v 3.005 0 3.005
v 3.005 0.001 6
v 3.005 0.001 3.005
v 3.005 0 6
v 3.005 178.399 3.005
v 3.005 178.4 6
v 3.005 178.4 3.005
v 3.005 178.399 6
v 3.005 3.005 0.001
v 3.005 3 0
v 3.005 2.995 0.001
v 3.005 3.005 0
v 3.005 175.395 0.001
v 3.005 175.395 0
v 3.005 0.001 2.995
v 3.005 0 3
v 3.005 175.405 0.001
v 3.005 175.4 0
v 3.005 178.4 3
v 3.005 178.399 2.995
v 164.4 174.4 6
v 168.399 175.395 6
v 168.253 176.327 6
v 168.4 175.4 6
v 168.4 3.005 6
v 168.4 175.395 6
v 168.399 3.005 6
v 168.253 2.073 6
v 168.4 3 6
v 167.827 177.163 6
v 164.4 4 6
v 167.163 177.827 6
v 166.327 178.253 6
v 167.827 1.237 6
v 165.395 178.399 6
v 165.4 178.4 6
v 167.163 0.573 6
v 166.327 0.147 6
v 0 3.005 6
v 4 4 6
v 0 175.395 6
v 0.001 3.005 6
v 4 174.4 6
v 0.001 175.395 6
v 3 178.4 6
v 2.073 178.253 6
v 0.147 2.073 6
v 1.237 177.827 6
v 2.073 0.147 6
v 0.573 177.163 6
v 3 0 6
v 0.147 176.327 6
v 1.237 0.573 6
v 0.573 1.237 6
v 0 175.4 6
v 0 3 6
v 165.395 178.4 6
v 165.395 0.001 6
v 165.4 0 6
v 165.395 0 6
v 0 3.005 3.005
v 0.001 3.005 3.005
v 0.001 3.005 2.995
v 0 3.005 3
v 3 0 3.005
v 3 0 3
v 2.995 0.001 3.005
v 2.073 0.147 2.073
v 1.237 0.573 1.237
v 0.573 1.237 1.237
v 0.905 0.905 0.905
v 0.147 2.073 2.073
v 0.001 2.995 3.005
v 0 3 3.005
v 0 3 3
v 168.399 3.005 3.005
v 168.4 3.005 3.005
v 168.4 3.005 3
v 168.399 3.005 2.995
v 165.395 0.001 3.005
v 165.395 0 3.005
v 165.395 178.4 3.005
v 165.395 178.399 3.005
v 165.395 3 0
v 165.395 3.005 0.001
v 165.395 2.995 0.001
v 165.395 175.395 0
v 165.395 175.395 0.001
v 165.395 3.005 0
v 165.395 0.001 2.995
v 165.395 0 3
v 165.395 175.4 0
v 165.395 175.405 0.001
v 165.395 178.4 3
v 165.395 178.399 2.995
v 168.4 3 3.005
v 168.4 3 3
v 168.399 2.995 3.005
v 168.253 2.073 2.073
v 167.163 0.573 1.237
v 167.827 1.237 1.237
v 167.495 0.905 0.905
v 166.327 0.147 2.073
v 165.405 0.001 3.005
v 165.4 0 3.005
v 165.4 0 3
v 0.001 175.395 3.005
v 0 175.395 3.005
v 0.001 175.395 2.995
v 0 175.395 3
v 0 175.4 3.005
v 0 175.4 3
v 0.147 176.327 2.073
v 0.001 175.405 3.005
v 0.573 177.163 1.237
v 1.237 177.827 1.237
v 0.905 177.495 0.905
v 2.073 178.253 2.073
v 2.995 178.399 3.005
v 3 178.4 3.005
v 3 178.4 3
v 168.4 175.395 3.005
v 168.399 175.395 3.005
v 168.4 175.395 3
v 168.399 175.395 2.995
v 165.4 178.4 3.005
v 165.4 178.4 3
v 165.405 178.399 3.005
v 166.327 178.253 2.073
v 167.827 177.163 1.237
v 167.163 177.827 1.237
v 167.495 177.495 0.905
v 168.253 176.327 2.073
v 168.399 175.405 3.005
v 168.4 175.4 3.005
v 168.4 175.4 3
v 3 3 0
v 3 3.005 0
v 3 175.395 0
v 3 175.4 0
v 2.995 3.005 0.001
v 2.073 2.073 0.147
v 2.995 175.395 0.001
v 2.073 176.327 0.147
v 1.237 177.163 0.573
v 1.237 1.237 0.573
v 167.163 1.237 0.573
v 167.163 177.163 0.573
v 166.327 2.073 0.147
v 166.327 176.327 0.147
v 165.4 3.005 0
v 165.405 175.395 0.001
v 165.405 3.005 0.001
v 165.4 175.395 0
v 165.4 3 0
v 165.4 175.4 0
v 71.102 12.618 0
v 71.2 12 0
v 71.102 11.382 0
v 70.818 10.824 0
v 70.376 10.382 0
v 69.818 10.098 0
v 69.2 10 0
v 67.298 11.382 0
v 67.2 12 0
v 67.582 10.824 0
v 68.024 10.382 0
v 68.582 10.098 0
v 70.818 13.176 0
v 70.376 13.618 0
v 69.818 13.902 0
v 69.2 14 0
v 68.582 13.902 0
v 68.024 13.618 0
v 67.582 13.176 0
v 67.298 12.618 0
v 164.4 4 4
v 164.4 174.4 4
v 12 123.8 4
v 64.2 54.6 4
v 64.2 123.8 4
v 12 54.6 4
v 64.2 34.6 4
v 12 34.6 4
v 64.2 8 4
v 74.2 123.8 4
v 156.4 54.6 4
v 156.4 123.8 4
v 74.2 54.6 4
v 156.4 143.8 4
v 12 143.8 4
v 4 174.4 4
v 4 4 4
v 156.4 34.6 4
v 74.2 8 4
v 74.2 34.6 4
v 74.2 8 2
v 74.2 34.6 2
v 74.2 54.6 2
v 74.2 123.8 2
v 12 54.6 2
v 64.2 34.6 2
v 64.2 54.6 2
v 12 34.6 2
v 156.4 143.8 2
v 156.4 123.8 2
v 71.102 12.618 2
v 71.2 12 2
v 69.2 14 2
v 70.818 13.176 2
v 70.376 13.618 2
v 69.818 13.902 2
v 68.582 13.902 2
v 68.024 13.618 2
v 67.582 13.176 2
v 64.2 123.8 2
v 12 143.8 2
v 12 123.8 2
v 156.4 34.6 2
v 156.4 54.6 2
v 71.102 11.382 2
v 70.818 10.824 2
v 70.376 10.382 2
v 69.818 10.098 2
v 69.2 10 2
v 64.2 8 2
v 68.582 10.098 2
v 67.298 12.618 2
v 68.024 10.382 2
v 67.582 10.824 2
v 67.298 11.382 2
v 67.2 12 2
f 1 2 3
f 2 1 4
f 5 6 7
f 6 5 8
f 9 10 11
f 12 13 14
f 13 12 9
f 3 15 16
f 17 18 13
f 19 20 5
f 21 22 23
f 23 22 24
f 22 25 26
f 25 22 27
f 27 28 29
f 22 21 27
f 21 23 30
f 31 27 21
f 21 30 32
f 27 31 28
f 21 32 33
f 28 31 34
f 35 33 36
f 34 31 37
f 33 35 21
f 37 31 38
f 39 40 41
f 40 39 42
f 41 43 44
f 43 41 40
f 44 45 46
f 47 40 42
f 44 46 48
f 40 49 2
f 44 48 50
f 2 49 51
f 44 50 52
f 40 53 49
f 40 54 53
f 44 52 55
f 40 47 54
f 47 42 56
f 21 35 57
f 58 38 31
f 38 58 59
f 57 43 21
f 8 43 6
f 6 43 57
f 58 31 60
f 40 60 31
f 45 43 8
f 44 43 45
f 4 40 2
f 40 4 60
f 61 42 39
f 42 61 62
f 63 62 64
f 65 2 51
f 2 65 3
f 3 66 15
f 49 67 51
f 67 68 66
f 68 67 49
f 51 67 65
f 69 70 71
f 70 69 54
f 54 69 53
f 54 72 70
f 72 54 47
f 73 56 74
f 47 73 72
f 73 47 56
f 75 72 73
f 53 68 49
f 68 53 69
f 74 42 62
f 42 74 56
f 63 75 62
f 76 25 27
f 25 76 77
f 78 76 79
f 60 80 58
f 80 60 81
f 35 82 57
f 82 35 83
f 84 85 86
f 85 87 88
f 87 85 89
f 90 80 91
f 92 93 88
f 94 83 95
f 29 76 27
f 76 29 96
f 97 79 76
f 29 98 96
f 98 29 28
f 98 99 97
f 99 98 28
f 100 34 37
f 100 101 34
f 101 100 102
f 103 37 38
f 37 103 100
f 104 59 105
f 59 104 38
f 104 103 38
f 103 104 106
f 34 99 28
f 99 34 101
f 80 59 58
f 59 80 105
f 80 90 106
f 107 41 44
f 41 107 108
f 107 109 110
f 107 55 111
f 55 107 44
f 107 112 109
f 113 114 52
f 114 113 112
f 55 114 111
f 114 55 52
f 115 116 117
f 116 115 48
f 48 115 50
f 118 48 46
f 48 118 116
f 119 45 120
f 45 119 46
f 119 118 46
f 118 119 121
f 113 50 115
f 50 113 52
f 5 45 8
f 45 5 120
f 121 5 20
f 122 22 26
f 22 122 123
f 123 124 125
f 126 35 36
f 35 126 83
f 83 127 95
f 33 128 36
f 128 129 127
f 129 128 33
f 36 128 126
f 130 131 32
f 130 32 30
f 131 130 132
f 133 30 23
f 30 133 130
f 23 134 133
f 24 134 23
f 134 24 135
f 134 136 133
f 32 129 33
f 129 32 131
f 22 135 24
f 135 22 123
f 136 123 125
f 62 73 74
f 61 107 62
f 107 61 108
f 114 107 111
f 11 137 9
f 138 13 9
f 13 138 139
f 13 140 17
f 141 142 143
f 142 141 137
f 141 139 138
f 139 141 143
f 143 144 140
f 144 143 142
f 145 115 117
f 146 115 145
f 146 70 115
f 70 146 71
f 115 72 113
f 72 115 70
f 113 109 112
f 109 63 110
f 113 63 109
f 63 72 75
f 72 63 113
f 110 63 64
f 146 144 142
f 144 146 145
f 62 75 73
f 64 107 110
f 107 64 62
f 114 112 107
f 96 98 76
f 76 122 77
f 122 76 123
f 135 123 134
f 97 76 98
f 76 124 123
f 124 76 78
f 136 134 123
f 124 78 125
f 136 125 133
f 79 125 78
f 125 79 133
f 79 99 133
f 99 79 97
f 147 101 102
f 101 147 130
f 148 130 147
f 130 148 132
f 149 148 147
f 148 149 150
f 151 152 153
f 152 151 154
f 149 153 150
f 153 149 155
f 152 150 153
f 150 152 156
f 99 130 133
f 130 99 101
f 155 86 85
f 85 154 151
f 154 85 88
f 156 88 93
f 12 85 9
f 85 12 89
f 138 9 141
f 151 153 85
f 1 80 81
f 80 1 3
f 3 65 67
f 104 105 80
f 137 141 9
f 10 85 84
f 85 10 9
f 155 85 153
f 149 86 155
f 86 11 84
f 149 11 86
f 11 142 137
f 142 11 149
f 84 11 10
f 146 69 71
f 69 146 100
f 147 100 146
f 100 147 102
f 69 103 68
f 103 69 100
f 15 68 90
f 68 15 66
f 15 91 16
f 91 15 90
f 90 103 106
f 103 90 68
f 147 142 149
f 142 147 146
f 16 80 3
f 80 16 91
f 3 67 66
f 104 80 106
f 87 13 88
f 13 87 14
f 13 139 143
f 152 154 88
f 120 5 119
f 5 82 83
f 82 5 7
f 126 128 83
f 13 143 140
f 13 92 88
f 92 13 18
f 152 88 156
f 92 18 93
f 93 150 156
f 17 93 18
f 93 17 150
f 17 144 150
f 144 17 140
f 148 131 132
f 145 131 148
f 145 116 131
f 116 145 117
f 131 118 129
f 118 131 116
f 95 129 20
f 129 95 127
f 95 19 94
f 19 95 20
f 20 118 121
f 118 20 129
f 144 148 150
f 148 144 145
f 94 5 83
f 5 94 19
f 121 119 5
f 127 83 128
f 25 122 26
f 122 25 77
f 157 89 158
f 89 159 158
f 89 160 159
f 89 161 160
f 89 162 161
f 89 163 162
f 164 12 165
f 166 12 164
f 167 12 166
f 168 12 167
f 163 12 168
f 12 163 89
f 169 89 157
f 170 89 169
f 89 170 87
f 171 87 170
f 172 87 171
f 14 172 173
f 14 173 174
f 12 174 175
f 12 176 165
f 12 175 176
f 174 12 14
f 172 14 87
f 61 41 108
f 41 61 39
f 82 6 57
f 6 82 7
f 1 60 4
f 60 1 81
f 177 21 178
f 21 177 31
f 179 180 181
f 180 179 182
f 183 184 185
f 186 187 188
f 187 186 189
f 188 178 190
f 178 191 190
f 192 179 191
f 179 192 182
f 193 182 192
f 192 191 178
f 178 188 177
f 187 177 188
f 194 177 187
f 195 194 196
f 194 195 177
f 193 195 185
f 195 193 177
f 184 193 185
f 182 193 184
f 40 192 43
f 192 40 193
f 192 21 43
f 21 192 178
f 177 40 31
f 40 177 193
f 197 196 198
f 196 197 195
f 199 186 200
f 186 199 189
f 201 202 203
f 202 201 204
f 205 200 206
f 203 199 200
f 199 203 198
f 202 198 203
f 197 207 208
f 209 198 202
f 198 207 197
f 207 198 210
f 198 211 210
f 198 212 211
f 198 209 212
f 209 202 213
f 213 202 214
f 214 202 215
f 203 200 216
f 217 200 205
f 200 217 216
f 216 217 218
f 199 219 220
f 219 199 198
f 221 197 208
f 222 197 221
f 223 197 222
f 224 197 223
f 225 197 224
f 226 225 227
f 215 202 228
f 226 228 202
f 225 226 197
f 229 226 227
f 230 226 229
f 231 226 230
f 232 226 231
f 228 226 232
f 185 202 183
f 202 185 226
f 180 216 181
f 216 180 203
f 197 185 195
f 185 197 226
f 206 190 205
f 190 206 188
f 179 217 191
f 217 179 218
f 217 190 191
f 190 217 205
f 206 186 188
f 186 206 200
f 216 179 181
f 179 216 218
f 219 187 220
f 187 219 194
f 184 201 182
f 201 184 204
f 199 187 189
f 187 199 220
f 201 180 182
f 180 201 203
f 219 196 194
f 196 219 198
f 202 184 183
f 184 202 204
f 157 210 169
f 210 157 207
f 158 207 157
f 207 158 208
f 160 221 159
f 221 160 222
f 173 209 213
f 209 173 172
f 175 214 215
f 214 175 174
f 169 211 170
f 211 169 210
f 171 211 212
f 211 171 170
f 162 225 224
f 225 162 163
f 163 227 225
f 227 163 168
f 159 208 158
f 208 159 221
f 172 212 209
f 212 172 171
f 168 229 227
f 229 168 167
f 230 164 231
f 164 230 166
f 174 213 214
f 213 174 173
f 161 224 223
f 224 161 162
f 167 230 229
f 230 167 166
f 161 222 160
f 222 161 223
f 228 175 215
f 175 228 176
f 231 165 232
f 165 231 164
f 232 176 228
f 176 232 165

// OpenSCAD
hole_size = 4;
side_wall = 4.0;
bottom_wall = 4;
touch_width = 160.4;
touch_length = 170.4;
touch_depth = 2.0;
wire_cut_depth = 4.0;
wire_cut_width = 10.0;
side_fillet_radius = 3.0;
bottom_fillet_radius = 3.0;

// Set the angular resolution ($fn segments per 360 deg)
$fn = 20;

box_height = bottom_wall + touch_depth;
box_width = touch_width+side_wall*2;
box_length = touch_length+side_wall*2;

module fillet(r, h) {
    translate([r / 2, r / 2, 0])
    difference() {
        cube([r + 0.01, r + 0.01, h], center = true);
        translate([r/2, r/2, 0])
          cylinder(r = r, h = h + 1, center = true);
    }
}

difference(){
    // Main box
    cube([box_width, box_length, box_height]);

    // cut-out the touch screen cavity
    //translate([side_wall+lip_width, side_wall+lip_width, bottom_wall])
    //  cube([trans_width-lip_width*2, trans_length-lip_width*2, box_height]);

    // cut for the touch screen
    translate([side_wall, side_wall, box_height-touch_depth])
      cube([touch_width, touch_length, touch_depth+0.1]);

    // outside cut for wires
    translate([box_width/2-20, side_wall*2, box_height-wire_cut_depth])
      cube([wire_cut_width, box_length*0.75-side_wall, wire_cut_depth*2]);

    // inside cut for wires
    translate([side_wall*3, box_length*0.75-wire_cut_width, box_height-wire_cut_depth])
      cube([box_width-side_wall*6, wire_cut_width*2, wire_cut_depth*2]);
    translate([side_wall*3, box_length*0.25-wire_cut_width, box_height-wire_cut_depth])
      cube([box_width-side_wall*6, wire_cut_width*2, wire_cut_depth*2]);

    // holes
    translate([wire_cut_width/2+box_width/2-20, side_wall*2+hole_size, -0.1])
      cylinder(r=hole_size/2, h=box_height);

    // fillets for the side edges
    fillet(side_fillet_radius, box_height*2);
    translate([box_width,0,0])
      rotate(a=[0,0,90])
        fillet(side_fillet_radius, box_height*2);
    translate([0,box_length,0])
      rotate(a=[0,0,270])
        fillet(side_fillet_radius, box_height*2);
    translate([box_width,box_length,0])
      rotate(a=[0,0,180])
        fillet(side_fillet_radius, box_height*2);

    // fillets for the two bottom length-wise edges
    rotate(a=[90,0,0])
      fillet(bottom_fillet_radius, box_length*2+.1);
    translate([box_width,0,0])
      rotate(a=[90,-90,0])
        fillet(bottom_fillet_radius, box_length*2+.1);
    // fillets for the two bottom width-wise edges
    rotate(a=[90,0,90])
      fillet(bottom_fillet_radius, box_width*2+.1);
    translate([0,box_length,0])
      rotate(a=[90,0,-90])
        fillet(bottom_fillet_radius, box_width*2+.1);
}
